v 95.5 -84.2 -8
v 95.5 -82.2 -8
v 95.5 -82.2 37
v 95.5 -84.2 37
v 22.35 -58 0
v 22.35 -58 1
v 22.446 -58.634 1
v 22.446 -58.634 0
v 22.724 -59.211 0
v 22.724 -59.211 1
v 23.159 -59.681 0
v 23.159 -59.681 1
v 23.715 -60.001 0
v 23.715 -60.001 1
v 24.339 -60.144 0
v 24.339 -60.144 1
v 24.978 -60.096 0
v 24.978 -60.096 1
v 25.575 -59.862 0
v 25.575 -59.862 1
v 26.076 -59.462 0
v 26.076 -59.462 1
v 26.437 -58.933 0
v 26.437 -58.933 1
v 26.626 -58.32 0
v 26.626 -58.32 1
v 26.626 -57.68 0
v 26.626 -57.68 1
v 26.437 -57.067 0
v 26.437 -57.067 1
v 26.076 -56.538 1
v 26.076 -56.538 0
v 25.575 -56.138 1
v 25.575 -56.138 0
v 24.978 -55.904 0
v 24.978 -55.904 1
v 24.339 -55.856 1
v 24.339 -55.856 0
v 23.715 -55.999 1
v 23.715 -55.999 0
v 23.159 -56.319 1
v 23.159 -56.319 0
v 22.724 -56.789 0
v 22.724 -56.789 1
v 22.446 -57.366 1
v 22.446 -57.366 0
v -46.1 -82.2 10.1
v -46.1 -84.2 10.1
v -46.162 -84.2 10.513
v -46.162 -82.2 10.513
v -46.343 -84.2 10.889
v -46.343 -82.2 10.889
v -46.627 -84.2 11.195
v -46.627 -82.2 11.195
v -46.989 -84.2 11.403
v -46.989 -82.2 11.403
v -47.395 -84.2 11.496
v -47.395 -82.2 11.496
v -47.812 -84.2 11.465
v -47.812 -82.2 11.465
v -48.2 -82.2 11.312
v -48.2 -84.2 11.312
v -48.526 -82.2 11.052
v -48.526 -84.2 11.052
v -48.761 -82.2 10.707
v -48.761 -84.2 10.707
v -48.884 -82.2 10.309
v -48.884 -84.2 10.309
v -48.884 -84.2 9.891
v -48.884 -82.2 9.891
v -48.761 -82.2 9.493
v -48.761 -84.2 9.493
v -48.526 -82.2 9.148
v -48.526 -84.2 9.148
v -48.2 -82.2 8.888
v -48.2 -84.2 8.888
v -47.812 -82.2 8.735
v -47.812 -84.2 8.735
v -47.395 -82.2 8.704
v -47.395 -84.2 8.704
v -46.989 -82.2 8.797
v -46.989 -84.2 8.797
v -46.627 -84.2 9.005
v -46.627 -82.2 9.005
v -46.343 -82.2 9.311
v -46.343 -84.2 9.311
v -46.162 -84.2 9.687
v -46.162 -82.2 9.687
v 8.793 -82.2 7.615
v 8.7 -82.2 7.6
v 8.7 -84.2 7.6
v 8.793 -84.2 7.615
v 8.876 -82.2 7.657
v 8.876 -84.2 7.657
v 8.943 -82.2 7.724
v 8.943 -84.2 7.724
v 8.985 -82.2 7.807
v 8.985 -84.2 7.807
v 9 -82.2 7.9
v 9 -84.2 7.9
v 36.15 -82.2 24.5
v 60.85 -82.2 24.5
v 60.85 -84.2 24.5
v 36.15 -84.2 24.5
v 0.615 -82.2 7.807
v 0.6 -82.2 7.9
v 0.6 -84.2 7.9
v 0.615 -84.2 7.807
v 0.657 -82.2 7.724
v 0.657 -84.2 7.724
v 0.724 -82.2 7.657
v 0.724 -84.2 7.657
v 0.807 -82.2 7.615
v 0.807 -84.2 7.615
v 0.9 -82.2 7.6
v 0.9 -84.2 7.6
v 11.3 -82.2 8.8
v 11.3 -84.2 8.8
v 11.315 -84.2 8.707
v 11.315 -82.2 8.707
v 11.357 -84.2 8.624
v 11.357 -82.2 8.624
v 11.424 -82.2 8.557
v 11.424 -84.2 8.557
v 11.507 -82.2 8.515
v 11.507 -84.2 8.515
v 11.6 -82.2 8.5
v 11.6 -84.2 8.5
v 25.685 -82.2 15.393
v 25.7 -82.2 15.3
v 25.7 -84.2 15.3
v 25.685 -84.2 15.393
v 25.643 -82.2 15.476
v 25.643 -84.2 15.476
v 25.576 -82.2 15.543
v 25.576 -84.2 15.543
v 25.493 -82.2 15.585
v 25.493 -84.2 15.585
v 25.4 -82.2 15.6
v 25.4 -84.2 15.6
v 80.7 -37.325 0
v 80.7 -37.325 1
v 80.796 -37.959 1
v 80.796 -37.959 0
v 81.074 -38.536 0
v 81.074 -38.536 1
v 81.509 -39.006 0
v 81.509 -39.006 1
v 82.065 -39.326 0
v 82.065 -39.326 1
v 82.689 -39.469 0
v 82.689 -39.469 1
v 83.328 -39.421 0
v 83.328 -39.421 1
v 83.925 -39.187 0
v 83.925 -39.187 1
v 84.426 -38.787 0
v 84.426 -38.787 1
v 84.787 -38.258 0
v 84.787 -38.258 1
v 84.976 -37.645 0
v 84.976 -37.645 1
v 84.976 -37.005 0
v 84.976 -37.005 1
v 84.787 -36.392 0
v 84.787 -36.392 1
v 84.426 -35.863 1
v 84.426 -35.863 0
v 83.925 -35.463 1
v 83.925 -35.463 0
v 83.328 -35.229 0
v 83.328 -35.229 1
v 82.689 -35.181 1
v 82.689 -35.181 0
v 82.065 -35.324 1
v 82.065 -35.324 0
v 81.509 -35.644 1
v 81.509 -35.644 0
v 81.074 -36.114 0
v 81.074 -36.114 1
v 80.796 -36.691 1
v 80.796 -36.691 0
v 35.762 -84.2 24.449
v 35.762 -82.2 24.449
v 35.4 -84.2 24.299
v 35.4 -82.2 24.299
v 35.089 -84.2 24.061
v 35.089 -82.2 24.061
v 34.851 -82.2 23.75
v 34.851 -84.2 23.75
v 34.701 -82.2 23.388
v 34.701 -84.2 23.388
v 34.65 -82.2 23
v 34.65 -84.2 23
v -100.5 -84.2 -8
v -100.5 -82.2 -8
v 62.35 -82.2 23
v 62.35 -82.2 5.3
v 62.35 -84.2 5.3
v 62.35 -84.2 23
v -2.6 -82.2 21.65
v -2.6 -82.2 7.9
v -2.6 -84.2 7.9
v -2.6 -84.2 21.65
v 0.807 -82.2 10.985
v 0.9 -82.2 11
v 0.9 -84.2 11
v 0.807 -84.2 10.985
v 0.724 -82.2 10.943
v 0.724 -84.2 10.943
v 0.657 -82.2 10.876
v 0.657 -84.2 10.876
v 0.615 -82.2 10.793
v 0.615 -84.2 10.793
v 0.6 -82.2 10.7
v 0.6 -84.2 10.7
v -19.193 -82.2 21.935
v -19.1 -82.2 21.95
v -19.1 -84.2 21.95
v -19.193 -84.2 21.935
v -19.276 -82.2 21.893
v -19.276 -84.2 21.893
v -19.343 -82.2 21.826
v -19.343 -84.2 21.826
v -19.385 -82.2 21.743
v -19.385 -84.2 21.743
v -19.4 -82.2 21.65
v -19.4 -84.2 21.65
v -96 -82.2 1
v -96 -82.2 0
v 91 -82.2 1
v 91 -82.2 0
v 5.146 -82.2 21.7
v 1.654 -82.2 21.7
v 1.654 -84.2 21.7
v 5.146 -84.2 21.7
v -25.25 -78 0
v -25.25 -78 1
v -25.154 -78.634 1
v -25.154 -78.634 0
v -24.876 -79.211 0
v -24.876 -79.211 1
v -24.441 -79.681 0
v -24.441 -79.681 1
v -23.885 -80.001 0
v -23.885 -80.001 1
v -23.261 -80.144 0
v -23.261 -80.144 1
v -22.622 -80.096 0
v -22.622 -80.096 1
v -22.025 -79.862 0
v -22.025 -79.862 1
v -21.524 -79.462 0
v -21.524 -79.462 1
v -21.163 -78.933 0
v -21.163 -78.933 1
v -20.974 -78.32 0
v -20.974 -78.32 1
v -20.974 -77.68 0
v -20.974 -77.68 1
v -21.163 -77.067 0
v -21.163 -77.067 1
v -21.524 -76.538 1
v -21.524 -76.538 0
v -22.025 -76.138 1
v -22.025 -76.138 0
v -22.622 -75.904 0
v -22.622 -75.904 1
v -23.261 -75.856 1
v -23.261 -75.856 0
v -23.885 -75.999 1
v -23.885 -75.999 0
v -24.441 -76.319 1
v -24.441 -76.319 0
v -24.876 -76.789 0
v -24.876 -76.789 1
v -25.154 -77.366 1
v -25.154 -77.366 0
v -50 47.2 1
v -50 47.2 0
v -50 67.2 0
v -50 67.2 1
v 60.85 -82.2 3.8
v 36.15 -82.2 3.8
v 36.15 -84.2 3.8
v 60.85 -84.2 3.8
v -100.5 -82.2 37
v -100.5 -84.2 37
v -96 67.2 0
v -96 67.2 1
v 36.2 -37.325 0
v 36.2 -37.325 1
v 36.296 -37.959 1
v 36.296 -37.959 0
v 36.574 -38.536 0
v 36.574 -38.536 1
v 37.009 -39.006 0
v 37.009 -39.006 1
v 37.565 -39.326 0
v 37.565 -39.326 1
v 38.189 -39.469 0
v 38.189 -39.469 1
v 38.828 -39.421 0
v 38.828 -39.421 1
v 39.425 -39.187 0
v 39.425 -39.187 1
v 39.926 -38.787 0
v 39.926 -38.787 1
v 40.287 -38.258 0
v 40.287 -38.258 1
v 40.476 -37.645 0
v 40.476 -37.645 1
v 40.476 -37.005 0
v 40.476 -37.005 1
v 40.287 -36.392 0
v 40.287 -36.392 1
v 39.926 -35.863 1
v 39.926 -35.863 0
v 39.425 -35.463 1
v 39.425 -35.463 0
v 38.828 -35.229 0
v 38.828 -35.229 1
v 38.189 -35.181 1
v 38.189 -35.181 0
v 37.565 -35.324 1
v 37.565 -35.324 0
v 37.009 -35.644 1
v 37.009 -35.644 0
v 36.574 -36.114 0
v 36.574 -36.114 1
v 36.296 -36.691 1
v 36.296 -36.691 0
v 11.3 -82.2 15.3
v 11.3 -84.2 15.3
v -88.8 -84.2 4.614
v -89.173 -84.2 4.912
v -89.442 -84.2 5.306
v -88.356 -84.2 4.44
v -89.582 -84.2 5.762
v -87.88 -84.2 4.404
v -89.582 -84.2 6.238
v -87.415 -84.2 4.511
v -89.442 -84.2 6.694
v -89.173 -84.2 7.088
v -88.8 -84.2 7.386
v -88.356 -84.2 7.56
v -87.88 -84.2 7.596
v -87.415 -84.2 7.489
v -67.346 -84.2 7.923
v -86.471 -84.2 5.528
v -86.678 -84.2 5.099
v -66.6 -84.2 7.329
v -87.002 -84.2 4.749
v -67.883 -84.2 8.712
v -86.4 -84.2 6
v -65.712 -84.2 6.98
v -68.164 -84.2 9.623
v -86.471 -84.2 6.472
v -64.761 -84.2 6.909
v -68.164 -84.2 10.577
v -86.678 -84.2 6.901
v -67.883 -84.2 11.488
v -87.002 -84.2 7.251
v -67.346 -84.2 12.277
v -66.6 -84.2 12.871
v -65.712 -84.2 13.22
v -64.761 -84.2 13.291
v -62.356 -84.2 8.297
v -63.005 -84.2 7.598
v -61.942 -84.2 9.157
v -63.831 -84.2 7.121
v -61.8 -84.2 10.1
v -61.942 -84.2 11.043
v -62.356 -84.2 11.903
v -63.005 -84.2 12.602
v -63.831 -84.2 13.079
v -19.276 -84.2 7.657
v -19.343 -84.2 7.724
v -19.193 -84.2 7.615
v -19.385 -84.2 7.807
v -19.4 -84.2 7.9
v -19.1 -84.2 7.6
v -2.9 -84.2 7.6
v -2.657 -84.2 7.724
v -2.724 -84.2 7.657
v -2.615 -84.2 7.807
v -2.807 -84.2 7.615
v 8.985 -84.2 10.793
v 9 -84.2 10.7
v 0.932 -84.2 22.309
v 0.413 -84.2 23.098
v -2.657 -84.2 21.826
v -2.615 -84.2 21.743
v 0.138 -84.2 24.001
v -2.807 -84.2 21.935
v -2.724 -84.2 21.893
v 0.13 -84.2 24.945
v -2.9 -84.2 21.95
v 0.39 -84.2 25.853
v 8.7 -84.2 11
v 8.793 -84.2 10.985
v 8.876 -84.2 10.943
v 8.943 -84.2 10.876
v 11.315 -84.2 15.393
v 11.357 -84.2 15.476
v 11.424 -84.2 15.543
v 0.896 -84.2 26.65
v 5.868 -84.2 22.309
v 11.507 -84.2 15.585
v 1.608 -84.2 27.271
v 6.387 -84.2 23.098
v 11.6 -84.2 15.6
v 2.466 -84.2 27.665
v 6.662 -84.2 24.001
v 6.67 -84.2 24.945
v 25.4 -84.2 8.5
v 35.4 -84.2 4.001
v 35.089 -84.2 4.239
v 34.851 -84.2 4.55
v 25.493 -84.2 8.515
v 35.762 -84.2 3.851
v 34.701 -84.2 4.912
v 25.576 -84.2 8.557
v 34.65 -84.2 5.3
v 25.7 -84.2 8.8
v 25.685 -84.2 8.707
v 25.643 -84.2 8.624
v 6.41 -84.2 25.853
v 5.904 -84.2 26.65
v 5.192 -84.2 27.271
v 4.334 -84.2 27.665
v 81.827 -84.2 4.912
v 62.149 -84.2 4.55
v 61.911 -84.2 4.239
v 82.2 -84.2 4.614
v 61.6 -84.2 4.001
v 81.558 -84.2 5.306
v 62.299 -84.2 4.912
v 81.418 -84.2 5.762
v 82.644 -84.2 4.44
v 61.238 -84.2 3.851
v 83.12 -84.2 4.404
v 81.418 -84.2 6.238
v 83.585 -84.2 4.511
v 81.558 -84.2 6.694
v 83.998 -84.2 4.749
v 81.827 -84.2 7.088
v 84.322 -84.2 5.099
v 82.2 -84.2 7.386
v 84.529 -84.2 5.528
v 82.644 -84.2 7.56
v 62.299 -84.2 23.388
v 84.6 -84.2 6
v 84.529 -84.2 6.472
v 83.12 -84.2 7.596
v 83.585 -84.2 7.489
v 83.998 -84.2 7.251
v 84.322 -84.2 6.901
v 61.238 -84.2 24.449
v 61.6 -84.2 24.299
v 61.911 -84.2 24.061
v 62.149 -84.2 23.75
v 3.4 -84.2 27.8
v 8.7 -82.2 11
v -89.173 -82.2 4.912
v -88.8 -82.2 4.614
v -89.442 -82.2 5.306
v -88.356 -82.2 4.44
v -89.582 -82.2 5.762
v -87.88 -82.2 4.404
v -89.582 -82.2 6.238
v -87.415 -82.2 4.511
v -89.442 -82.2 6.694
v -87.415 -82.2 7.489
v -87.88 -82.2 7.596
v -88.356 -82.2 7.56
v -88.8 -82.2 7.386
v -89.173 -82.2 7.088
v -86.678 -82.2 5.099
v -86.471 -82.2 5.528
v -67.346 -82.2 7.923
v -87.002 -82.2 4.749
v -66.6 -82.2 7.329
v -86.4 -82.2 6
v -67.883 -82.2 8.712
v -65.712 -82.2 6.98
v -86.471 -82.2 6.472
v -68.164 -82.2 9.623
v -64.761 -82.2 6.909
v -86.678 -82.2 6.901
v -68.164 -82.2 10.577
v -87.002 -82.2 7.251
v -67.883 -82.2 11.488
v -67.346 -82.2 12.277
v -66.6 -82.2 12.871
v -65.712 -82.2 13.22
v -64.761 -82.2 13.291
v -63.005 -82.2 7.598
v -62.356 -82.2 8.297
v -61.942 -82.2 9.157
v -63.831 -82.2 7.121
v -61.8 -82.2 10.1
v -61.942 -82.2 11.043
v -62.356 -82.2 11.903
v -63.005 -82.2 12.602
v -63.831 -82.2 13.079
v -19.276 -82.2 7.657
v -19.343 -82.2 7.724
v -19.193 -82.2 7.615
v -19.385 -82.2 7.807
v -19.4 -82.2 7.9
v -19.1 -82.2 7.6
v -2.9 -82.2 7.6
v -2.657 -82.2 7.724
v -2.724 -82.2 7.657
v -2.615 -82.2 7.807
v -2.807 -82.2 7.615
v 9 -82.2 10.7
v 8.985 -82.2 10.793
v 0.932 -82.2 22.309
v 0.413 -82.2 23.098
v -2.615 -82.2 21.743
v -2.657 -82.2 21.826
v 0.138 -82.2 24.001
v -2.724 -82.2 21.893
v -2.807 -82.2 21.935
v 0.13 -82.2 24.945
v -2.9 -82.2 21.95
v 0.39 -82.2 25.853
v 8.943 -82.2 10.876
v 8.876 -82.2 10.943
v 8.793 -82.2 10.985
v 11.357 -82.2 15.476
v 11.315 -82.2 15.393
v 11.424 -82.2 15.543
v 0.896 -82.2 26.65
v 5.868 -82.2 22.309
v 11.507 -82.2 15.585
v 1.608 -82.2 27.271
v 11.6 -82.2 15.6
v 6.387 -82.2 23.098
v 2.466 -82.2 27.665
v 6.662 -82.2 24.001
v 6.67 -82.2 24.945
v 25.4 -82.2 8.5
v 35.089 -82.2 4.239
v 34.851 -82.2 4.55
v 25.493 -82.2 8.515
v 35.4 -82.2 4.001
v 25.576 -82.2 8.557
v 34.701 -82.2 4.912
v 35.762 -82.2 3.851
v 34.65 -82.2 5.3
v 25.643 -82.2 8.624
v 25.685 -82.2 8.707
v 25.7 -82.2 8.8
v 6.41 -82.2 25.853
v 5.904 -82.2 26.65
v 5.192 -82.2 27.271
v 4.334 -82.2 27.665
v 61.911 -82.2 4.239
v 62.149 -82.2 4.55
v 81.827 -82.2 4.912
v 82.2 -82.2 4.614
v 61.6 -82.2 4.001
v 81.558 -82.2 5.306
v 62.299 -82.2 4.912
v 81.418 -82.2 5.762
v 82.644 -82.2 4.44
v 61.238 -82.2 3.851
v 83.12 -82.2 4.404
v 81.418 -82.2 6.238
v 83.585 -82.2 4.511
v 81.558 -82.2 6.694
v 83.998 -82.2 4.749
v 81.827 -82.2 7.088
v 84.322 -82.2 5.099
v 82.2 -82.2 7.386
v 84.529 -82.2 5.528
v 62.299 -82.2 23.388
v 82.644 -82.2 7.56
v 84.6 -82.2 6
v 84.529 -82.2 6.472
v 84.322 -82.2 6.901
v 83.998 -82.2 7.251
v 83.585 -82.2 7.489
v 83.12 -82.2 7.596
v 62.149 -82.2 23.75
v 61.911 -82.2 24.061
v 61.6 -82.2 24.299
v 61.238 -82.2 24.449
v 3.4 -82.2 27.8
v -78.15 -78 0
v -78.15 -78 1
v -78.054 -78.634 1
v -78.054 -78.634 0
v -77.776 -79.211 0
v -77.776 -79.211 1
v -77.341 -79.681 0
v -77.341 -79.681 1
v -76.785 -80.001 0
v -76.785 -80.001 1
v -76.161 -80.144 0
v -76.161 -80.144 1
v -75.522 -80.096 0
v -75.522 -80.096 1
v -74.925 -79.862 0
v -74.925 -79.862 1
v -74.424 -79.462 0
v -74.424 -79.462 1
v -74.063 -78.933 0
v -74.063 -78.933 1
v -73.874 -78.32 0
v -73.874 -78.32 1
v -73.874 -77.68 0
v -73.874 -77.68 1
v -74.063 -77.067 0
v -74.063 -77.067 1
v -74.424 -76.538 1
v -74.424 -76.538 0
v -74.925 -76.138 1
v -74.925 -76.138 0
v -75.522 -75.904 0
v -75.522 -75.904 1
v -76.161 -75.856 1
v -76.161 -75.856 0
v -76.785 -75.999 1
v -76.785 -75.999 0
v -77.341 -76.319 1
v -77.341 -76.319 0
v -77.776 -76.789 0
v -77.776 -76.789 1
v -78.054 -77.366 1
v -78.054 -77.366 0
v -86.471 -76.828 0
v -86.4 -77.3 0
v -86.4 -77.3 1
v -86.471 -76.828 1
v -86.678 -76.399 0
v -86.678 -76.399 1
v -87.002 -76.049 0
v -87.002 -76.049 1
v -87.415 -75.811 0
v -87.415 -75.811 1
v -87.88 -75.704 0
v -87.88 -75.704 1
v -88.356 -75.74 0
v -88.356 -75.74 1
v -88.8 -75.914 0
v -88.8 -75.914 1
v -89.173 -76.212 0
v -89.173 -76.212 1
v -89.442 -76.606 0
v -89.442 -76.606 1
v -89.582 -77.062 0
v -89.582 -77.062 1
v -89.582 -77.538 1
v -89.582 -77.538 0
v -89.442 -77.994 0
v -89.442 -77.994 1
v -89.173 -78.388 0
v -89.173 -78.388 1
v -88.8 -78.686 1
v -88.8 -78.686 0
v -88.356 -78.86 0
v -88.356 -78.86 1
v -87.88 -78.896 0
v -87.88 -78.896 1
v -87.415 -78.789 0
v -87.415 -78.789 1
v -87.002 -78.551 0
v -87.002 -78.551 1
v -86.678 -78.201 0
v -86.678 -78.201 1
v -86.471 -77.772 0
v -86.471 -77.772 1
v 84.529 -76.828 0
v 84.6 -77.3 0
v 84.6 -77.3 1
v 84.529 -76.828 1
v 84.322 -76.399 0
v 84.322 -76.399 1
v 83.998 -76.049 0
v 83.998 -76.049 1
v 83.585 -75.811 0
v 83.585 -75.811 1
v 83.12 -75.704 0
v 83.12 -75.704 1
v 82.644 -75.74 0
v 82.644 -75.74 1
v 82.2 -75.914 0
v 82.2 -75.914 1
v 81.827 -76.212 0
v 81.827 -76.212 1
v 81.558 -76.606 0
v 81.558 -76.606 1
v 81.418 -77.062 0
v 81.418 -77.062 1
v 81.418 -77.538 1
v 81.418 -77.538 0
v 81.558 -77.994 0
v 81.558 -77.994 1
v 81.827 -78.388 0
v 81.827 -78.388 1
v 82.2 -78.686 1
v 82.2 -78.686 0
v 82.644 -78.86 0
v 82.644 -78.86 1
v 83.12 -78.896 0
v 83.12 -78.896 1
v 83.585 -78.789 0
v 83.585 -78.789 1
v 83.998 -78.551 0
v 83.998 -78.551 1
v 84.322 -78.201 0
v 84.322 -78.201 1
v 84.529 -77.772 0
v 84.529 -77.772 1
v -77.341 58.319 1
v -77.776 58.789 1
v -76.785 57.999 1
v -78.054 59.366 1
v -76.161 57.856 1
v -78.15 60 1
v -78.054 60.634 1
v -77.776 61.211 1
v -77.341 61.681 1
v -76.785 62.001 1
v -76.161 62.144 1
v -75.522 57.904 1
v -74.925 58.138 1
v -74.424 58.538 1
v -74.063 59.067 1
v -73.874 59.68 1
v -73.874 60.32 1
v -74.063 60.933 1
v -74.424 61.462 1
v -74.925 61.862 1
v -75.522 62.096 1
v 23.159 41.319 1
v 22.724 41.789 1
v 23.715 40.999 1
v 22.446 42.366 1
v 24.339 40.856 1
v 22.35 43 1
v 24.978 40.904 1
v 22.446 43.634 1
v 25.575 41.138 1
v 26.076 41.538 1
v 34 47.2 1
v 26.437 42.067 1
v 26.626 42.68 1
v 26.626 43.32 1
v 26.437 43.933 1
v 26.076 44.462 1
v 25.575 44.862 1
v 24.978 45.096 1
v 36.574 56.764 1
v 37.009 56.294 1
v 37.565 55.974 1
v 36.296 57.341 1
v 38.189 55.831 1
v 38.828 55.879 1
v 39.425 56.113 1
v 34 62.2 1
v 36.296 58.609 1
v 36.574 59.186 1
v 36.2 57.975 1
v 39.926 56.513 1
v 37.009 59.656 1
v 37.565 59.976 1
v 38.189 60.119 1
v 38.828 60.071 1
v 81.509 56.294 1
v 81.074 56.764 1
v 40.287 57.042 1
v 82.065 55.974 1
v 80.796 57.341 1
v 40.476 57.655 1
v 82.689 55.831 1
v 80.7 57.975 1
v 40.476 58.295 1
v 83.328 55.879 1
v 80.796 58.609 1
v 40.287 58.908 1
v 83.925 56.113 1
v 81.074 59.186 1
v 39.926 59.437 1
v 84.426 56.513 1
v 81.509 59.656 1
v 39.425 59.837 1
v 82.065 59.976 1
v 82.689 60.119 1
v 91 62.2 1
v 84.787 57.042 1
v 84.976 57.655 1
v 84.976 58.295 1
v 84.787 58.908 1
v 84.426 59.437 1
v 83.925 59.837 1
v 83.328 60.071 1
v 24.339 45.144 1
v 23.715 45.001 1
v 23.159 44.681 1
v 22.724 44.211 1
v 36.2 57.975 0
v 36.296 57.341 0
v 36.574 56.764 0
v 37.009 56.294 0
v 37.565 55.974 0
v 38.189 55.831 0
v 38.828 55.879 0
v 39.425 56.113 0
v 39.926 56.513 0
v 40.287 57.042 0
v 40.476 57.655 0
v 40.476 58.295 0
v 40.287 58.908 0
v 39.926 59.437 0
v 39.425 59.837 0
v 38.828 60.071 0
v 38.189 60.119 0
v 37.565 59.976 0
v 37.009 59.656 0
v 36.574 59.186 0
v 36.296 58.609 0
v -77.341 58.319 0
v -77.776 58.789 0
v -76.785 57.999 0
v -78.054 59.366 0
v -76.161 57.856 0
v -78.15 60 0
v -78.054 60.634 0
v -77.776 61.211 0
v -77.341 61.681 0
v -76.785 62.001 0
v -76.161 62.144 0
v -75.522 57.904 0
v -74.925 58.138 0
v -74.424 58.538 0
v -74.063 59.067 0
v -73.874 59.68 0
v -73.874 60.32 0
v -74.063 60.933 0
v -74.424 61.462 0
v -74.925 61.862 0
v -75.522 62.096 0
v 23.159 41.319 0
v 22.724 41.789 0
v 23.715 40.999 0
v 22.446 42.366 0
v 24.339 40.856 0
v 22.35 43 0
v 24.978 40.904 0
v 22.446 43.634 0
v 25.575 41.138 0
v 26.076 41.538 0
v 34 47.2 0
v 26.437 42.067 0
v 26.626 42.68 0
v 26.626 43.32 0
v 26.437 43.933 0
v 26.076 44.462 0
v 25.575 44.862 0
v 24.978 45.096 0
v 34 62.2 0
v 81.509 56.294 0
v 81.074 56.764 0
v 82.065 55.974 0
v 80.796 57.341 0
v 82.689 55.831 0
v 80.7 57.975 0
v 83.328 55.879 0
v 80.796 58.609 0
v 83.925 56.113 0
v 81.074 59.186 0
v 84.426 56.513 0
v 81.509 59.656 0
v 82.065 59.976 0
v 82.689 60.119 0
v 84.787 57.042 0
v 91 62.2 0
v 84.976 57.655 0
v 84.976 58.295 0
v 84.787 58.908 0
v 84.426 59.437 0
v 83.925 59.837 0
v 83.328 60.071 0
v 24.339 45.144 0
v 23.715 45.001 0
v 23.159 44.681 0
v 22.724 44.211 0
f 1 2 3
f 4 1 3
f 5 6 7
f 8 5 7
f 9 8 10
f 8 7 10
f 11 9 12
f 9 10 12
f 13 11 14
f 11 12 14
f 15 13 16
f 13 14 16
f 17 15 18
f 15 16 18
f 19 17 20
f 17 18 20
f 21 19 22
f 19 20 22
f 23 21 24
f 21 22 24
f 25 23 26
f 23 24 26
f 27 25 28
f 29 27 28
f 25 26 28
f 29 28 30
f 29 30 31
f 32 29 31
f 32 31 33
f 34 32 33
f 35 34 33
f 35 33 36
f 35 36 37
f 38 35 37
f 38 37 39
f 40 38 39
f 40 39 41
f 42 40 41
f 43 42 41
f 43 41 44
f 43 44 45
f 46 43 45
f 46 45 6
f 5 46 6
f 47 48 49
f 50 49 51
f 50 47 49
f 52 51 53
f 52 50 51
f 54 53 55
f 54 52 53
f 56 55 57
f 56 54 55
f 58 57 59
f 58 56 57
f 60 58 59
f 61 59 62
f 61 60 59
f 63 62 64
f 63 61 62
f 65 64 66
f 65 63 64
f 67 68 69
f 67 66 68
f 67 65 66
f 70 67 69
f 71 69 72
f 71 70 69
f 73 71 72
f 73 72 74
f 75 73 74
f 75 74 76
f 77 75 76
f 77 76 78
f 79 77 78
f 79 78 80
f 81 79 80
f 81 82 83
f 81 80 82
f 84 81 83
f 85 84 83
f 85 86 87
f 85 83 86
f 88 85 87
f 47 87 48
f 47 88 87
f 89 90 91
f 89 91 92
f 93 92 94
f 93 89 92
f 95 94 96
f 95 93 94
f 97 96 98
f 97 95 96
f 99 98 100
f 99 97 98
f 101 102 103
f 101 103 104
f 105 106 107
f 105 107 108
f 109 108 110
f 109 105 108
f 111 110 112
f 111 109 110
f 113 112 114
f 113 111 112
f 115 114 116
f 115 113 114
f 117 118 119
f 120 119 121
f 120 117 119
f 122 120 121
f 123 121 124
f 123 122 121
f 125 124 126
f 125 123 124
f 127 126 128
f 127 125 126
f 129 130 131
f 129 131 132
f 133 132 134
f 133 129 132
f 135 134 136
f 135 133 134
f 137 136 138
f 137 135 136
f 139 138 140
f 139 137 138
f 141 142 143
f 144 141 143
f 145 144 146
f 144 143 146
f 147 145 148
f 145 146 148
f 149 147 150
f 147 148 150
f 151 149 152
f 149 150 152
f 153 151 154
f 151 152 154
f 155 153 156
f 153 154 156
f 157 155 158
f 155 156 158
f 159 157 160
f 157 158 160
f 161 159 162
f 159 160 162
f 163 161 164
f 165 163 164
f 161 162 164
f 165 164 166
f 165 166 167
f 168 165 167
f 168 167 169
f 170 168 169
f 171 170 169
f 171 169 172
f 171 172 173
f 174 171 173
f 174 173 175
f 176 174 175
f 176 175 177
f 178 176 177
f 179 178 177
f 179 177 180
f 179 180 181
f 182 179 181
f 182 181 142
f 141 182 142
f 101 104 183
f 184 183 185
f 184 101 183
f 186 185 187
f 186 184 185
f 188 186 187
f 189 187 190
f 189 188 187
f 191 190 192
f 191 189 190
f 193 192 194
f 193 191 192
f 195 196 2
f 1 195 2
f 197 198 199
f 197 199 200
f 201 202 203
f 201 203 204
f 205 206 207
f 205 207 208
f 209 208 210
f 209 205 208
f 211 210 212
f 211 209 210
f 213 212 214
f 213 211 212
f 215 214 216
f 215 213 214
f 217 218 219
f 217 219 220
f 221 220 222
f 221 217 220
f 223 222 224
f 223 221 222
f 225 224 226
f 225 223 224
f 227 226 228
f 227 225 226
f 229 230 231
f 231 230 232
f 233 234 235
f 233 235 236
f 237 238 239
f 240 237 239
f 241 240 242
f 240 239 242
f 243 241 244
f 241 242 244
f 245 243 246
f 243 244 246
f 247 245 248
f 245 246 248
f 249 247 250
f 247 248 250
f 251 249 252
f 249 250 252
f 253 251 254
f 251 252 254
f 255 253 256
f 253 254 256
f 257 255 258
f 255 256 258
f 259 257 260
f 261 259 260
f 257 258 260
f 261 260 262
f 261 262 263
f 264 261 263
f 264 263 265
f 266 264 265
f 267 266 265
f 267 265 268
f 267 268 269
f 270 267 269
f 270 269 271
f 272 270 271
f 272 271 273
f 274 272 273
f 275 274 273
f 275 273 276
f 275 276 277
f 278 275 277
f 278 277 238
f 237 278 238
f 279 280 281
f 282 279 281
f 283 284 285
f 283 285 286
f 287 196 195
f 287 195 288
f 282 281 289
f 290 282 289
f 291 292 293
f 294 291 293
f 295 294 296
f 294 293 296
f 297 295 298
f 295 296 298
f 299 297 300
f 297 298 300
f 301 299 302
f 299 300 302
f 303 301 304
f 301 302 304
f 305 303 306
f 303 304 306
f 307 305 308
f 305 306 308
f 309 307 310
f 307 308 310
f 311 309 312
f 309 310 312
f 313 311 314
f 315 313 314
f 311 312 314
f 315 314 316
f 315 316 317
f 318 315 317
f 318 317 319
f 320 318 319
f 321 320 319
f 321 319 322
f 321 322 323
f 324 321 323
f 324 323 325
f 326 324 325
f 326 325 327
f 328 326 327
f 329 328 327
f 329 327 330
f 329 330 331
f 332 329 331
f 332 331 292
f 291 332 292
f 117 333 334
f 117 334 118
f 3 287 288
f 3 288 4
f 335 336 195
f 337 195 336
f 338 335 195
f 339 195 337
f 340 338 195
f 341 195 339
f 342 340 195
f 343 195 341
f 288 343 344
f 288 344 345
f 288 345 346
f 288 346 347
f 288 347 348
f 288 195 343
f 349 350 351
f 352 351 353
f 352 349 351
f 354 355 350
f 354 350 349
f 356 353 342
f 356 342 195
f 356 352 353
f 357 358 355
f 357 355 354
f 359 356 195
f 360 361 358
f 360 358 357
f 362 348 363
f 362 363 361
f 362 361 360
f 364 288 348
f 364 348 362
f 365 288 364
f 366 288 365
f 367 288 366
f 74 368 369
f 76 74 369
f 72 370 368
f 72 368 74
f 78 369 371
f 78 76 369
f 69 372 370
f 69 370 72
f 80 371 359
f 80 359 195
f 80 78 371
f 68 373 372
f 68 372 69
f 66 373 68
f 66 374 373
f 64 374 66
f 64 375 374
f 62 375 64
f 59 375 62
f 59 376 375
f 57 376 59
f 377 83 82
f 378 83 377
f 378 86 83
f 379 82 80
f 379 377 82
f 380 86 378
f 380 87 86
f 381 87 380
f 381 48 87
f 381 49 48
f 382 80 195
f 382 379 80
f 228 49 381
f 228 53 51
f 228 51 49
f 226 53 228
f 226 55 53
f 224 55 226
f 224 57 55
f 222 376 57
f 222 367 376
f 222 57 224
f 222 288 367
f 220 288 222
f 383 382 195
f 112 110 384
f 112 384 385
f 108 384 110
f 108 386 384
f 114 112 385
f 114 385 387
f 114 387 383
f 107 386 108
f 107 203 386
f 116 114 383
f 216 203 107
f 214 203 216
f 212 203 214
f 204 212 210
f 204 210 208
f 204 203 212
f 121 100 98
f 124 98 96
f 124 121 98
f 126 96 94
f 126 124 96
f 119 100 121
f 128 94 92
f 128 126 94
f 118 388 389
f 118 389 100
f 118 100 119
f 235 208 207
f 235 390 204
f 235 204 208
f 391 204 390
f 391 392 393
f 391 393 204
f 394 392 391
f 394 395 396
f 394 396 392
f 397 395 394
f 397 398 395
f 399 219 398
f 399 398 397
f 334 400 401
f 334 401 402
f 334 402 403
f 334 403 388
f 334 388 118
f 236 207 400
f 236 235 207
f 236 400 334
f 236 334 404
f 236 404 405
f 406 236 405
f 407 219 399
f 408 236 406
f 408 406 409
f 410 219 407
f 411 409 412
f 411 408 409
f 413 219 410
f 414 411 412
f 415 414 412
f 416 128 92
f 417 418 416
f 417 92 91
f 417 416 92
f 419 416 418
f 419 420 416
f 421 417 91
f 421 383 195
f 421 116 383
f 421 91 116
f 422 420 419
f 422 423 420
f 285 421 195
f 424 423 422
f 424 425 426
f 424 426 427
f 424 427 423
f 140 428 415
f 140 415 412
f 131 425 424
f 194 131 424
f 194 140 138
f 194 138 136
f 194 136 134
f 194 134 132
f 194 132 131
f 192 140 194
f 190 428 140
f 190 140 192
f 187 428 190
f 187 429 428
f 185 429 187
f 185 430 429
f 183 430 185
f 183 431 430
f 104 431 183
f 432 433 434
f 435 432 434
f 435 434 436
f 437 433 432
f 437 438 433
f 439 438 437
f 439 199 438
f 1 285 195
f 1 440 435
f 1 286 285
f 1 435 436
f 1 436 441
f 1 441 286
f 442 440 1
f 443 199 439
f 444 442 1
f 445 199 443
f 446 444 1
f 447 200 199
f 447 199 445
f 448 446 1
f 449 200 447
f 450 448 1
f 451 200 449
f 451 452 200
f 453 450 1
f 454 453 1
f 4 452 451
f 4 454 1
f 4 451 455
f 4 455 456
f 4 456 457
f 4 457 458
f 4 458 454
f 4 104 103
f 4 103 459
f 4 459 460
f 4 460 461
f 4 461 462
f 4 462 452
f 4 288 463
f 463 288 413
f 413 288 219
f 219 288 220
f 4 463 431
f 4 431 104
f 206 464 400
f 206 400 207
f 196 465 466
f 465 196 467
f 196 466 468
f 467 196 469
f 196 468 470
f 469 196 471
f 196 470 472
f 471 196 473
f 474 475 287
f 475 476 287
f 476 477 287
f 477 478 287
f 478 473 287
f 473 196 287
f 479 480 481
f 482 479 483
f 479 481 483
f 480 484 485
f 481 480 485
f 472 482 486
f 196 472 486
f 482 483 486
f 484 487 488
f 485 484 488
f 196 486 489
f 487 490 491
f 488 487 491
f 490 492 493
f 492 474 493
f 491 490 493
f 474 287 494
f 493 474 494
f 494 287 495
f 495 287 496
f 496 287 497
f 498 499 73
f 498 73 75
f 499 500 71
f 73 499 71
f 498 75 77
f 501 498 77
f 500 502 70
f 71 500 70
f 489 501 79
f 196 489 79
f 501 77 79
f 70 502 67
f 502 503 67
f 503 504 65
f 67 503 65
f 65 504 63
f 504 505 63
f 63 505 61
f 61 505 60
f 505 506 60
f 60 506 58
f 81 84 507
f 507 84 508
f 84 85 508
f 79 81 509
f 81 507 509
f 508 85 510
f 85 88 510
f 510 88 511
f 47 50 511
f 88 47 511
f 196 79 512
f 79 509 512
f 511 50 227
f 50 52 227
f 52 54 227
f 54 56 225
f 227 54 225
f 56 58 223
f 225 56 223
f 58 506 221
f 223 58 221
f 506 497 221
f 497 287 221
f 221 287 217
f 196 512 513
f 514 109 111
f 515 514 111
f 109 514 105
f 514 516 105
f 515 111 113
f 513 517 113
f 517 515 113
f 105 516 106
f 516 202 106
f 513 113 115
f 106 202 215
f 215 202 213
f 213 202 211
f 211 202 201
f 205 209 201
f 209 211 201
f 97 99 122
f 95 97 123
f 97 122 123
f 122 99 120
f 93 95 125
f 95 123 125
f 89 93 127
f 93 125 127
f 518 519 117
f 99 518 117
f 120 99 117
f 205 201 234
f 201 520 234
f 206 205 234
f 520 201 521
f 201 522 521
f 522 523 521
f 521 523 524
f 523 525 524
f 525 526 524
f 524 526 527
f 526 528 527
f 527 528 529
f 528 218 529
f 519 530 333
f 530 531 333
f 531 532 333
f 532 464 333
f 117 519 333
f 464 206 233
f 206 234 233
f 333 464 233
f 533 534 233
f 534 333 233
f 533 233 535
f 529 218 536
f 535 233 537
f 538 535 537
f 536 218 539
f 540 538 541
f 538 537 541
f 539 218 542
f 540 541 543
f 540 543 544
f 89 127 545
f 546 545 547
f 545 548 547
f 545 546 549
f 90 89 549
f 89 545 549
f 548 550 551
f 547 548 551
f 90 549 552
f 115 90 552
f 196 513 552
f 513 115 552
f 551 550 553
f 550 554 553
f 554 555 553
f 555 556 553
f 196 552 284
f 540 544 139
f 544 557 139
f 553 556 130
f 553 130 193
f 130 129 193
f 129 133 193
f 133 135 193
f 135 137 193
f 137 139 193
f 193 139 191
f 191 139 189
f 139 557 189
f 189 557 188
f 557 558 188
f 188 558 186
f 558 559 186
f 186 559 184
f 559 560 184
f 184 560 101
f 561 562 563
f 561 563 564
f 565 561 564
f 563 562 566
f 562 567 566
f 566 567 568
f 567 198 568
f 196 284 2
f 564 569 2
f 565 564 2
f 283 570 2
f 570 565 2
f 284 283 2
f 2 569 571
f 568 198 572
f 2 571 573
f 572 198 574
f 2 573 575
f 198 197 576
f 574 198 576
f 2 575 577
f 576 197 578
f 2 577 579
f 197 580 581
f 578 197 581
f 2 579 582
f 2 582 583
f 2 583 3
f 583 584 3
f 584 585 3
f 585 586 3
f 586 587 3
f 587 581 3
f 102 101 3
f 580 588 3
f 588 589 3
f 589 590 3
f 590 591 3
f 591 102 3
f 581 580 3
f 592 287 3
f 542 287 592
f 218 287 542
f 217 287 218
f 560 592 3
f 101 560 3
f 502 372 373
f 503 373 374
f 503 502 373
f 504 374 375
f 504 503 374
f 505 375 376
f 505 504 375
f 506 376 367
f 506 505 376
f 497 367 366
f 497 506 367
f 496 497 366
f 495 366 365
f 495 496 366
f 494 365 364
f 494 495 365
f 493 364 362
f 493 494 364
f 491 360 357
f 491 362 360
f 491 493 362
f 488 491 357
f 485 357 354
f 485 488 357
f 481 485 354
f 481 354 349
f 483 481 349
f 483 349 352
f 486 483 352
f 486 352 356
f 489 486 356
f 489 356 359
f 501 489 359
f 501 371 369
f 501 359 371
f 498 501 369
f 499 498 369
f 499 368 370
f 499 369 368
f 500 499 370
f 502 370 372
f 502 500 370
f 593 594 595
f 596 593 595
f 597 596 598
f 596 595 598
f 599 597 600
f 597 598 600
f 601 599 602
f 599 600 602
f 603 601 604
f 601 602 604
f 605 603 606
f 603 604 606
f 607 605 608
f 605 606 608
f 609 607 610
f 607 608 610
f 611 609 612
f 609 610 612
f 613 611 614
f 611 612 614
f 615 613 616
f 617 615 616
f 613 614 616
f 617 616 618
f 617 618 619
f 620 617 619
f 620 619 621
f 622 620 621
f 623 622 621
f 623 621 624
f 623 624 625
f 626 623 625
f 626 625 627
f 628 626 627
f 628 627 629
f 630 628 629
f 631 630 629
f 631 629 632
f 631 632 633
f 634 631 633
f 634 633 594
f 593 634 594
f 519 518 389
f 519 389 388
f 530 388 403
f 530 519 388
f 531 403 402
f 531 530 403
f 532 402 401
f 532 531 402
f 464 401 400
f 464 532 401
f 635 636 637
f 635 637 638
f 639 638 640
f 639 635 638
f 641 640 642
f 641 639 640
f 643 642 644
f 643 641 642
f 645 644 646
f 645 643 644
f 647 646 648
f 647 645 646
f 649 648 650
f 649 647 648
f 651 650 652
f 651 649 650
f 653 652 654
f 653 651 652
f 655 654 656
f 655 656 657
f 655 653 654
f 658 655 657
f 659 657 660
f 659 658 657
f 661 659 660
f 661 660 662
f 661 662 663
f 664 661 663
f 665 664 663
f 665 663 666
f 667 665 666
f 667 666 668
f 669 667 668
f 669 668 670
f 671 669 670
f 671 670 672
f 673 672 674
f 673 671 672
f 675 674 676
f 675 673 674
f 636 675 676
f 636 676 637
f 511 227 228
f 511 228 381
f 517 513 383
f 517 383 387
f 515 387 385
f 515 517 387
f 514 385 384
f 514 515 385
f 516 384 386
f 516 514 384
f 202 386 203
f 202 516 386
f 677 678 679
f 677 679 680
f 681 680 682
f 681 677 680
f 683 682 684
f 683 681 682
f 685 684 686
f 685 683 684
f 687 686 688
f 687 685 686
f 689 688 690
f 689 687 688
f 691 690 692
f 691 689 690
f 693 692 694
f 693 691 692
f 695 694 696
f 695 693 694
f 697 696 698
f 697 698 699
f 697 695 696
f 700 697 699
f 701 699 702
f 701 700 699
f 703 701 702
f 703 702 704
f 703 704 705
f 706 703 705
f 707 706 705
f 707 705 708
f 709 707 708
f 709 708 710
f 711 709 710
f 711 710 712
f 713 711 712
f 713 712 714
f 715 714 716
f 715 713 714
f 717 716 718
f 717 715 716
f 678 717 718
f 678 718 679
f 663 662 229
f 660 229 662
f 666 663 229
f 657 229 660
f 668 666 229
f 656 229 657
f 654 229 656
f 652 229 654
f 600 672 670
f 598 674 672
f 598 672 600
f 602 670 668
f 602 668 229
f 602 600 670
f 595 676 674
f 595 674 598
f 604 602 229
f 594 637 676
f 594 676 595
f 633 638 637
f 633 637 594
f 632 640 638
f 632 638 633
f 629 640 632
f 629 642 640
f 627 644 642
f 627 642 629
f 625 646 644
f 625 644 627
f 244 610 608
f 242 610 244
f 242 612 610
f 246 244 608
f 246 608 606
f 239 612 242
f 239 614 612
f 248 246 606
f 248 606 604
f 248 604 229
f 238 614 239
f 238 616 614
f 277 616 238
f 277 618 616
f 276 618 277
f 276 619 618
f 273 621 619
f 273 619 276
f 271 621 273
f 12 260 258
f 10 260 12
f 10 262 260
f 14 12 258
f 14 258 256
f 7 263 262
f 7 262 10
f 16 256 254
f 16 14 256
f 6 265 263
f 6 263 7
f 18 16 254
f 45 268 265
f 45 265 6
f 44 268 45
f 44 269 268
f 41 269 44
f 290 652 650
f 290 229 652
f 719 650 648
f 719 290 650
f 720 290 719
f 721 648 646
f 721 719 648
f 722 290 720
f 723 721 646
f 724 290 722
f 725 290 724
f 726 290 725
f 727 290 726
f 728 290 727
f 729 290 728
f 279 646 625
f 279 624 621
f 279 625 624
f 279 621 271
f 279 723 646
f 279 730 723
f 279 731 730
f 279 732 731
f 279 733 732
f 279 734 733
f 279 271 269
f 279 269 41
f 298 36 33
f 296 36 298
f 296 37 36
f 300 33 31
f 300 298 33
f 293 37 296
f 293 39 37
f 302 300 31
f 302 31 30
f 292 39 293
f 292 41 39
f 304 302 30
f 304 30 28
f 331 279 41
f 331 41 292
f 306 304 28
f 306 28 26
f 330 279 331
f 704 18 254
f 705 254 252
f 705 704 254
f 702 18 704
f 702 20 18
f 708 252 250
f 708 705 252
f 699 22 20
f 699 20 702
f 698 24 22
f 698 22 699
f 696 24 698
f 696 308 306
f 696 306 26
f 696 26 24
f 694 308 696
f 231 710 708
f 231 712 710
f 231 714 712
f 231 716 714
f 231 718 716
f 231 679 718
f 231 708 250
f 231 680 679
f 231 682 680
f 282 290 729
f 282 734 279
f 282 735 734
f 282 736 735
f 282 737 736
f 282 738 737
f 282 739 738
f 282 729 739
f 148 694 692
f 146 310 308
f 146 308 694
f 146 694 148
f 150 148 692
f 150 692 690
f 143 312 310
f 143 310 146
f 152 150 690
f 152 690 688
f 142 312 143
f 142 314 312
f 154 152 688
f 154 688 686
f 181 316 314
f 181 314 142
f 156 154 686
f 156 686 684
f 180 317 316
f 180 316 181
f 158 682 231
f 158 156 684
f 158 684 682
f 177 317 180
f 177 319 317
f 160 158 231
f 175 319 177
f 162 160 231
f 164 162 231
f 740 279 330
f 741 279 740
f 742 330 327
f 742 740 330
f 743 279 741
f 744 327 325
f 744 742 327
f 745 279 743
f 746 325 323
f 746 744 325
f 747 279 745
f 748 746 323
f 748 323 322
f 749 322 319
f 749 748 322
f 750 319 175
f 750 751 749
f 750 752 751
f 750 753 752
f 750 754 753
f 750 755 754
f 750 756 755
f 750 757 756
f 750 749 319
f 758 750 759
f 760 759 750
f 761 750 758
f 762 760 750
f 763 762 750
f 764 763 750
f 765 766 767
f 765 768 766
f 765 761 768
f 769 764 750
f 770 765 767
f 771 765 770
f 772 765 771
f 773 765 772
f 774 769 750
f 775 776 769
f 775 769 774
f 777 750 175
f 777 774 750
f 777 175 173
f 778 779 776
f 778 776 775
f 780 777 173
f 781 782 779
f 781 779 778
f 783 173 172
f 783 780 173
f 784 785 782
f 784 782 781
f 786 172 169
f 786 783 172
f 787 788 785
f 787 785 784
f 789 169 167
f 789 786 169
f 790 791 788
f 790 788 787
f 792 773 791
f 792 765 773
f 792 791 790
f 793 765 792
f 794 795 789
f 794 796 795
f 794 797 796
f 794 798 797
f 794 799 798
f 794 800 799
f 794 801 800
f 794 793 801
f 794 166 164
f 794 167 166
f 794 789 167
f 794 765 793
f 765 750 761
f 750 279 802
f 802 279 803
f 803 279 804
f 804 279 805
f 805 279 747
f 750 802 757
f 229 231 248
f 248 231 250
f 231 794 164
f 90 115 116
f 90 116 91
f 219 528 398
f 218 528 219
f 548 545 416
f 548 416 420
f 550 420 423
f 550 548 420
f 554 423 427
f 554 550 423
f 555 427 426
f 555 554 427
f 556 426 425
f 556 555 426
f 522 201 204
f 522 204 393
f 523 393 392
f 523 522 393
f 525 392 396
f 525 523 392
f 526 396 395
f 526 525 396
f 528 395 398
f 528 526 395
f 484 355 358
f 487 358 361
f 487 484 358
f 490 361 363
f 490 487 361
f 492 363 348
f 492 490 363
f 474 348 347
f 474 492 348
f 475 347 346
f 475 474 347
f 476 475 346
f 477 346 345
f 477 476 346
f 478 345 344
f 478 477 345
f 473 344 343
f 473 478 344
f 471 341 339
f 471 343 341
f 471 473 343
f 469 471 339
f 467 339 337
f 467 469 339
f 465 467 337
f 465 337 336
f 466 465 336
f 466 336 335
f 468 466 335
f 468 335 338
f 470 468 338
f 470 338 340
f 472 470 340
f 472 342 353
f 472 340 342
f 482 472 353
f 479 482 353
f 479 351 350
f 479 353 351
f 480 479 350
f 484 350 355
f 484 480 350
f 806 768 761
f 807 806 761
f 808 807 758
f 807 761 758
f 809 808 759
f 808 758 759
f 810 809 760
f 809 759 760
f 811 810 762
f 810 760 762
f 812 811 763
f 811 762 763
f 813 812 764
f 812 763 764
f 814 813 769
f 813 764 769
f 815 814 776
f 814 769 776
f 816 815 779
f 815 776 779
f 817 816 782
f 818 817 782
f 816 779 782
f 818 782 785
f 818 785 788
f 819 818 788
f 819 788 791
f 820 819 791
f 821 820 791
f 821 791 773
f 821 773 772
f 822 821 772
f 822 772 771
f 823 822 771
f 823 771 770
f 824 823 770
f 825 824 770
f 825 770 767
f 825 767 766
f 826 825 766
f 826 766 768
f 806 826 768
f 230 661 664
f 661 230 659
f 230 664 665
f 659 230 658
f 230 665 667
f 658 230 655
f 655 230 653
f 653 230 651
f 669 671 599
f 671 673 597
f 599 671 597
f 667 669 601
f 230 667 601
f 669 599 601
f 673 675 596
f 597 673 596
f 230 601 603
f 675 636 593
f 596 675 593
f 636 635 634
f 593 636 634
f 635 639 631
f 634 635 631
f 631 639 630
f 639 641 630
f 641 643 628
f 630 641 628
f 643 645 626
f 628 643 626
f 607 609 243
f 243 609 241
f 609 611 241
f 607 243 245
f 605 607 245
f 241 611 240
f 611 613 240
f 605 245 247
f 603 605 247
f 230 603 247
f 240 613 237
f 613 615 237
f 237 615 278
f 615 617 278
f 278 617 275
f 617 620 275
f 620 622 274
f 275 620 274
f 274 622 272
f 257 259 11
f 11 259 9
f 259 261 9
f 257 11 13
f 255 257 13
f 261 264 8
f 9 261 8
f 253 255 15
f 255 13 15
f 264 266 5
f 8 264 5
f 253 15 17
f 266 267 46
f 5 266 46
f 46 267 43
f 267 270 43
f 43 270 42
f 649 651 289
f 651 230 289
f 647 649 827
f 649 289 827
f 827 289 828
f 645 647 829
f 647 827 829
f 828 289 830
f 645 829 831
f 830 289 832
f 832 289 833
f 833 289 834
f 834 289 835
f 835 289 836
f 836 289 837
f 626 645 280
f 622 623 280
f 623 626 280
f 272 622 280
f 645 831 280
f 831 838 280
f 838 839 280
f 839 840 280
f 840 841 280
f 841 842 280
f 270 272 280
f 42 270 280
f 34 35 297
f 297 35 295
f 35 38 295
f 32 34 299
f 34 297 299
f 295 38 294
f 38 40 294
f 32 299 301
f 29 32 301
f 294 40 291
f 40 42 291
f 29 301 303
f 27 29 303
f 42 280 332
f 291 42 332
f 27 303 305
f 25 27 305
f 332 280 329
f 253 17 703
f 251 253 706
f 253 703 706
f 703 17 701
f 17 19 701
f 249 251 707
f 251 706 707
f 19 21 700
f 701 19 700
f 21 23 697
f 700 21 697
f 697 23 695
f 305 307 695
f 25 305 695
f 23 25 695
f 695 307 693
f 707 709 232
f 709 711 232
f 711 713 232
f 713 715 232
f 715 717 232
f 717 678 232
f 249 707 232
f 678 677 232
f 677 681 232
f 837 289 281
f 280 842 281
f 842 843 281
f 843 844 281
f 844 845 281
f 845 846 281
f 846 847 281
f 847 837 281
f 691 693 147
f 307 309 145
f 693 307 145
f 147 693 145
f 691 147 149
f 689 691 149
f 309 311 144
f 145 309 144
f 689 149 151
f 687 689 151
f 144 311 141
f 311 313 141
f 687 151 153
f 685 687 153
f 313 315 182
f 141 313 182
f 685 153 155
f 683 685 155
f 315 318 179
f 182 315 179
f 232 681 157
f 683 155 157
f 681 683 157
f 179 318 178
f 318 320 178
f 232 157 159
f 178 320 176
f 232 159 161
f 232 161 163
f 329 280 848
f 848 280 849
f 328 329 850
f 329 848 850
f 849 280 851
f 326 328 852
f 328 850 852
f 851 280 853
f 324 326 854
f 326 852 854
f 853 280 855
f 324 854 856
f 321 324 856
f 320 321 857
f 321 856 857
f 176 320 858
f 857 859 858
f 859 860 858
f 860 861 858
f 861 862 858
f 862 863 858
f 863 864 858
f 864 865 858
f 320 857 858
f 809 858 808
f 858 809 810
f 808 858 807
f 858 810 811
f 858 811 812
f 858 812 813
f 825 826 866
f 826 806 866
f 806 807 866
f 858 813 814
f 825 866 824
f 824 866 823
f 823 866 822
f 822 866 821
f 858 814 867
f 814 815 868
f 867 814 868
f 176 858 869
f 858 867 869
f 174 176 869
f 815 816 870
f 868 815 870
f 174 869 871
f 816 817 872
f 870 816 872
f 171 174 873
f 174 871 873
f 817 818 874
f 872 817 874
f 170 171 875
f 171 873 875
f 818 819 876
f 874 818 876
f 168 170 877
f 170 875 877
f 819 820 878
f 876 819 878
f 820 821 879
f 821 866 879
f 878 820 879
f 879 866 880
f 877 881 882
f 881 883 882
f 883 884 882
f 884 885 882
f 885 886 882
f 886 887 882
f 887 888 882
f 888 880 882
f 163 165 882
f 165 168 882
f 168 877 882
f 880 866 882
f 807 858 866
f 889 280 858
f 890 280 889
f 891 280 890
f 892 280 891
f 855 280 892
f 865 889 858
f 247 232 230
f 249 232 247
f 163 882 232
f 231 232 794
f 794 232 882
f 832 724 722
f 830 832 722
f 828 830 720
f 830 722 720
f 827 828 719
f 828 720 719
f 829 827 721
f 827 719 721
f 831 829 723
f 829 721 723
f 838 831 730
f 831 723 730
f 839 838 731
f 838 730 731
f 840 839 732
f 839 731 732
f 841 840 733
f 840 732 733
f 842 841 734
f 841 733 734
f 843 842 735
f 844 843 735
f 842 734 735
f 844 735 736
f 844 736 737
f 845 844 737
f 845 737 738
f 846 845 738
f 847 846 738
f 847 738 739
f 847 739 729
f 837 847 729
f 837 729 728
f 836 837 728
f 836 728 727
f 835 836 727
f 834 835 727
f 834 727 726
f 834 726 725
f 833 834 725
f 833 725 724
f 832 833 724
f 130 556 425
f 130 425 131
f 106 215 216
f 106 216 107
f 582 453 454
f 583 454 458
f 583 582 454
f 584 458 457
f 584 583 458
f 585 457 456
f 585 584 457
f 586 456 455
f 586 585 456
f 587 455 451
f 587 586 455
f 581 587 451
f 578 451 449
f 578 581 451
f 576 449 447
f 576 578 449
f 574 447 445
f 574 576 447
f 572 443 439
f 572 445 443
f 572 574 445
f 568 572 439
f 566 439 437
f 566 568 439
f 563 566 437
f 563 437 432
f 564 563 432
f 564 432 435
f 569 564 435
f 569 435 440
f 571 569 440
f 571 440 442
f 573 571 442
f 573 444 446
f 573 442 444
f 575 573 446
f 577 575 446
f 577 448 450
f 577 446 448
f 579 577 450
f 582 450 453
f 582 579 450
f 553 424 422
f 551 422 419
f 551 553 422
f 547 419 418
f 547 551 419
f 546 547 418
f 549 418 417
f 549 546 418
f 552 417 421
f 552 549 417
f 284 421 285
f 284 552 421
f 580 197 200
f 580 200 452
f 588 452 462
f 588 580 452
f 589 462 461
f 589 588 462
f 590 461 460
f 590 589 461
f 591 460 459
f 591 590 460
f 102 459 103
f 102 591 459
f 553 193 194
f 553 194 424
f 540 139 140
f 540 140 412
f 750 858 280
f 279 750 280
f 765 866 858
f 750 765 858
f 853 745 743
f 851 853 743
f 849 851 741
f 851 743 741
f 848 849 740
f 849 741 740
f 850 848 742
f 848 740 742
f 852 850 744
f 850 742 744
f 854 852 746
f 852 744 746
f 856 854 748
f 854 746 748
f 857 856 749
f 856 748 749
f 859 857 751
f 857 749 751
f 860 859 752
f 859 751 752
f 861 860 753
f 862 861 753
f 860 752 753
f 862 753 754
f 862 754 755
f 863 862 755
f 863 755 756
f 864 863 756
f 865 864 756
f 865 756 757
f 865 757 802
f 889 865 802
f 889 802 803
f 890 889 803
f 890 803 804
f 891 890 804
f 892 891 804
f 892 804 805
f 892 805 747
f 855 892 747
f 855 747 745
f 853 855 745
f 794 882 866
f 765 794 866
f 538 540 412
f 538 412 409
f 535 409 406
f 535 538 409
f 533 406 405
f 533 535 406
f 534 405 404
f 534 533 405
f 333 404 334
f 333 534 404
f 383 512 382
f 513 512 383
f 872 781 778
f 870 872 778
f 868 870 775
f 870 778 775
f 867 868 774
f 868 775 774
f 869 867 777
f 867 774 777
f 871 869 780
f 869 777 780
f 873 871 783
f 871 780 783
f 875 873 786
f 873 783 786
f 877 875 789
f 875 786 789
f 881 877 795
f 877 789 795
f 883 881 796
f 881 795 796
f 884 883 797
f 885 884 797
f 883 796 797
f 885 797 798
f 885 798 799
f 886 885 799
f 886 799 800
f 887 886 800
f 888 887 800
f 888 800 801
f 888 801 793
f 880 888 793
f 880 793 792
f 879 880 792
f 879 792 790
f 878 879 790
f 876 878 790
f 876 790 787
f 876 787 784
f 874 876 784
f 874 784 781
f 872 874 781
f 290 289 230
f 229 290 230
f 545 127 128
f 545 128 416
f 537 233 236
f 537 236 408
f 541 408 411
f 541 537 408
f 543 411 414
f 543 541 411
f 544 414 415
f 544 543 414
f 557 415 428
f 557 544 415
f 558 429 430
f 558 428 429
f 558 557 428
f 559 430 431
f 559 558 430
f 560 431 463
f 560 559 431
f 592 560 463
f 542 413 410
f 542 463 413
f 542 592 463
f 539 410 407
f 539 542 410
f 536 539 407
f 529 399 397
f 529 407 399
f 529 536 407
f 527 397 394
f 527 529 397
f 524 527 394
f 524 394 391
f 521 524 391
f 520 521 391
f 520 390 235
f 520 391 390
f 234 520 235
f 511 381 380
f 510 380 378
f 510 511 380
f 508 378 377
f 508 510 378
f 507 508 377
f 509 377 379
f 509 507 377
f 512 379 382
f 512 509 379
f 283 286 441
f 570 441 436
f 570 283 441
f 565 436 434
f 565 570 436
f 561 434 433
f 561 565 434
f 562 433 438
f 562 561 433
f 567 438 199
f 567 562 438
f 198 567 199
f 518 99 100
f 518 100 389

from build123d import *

# Parameters (mm, degrees)
F0_R       = 1.6
F3_DEPTH   = 1
F4_D       = 4.3
F4_ON_F2_D = 4.3
F6_W       = 196
F6_H       = 45
F8_DEPTH   = 2
F7_R       = 3.2
F7_R_2     = 1.4
F7_R_3     = 1.6
F9_DEPTH   = 2.001


with BuildPart() as f3:
    # F0 (on Top) → F3 (new body)
    with BuildSketch(Plane.XY):
        Polygon((34, 62.2000009459), (34, 47.2000009459), (-50, 47.2000009459), (-50, 67.2000009459), (-96, 67.2000009459), (-96, -82.1999990541), (91, -82.1999990541), (91, 62.2000009459), align=None)
        with Locations((-88, -77.2999990541)):
            Circle(F0_R, mode=Mode.SUBTRACT)
        with Locations((83, -77.2999990541)):
            Circle(F0_R, mode=Mode.SUBTRACT)
    extrude(amount=F3_DEPTH)

    # F4 (through all)
    with Locations(Plane(origin=(0, 0, 0), x_dir=(1, 0, 0), z_dir=(0, 0, -1))):
        with Locations((-76, -60), (-76, 78), (-23.1, 78), (24.5, 58), (24.5, -43)):
            Hole(F4_D / 2)

    # F4 on F2 (through all)
    with Locations(Plane(origin=(0, 0, 0), x_dir=(1, 0, 0), z_dir=(0, 0, -1))):
        with Locations((38.35, -57.9750009459), (82.85, -57.9750009459), (82.85, 37.3249990541), (38.35, 37.3249990541)):
            Hole(F4_ON_F2_D / 2)


with BuildPart() as f8:
    # F6 (on offset) → F8 (new body)
    with BuildSketch(Plane.XZ.offset(82.2)):
        with Locations((-2.5, 14.5)):
            Rectangle(F6_W, F6_H)
    extrude(amount=F8_DEPTH)

    # F7 (on offset) → F9 (cut, through all)
    with BuildSketch(Plane.XZ.offset(82.2)):
        with BuildLine():
            ThreePointArc((34.65, 5.3), (35.0893398282, 4.2393398282), (36.15, 3.8))
            Line((36.15, 3.8), (60.85, 3.8))
            ThreePointArc((60.85, 3.8), (61.9106601718, 4.2393398282), (62.35, 5.3))
            Line((62.35, 5.3), (62.35, 23))
            ThreePointArc((62.35, 23), (61.9106601718, 24.0606601718), (60.85, 24.5))
            Line((60.85, 24.5), (36.15, 24.5))
            ThreePointArc((36.15, 24.5), (35.0893398282, 24.0606601718), (34.65, 23))
            Line((34.65, 23), (34.65, 5.3))
        make_face()
        with Locations((-65, 10.1)):
            Circle(F7_R)
        with BuildLine():
            ThreePointArc((-19.4, 7.9), (-19.3121320344, 7.6878679656), (-19.1, 7.6))
            Line((-19.1, 7.6), (-2.9, 7.6))
            ThreePointArc((-2.9, 7.6), (-2.6878679656, 7.6878679656), (-2.6, 7.9))
            Line((-2.6, 7.9), (-2.6, 21.65))
            ThreePointArc((-2.6, 21.65), (-2.6878679656, 21.8621320344), (-2.9, 21.95))
            Line((-2.9, 21.95), (-19.1, 21.95))
            ThreePointArc((-19.1, 21.95), (-19.3121320344, 21.8621320344), (-19.4, 21.65))
            Line((-19.4, 21.65), (-19.4, 7.9))
        make_face()
        with BuildLine():
            ThreePointArc((0.6, 7.9), (0.6878679656, 7.6878679656), (0.9, 7.6))
            Line((0.9, 7.6), (8.7, 7.6))
            ThreePointArc((8.7, 7.6), (8.9121320344, 7.6878679656), (9, 7.9))
            Line((9, 7.9), (9, 10.7))
            ThreePointArc((9, 10.7), (8.9121320344, 10.9121320344), (8.7, 11))
            Line((8.7, 11), (0.9, 11))
            ThreePointArc((0.9, 11), (0.6878679656, 10.9121320344), (0.6, 10.7))
            Line((0.6, 10.7), (0.6, 7.9))
        make_face()
        with BuildLine():
            ThreePointArc((11.3, 8.8), (11.3878679656, 8.5878679656), (11.6, 8.5))
            Line((11.6, 8.5), (25.4, 8.5))
            ThreePointArc((25.4, 8.5), (25.6121320344, 8.5878679656), (25.7, 8.8))
            Line((25.7, 8.8), (25.7, 15.3))
            ThreePointArc((25.7, 15.3), (25.6121320344, 15.5121320344), (25.4, 15.6))
            Line((25.4, 15.6), (11.6, 15.6))
            ThreePointArc((11.6, 15.6), (11.3878679656, 15.5121320344), (11.3, 15.3))
            Line((11.3, 15.3), (11.3, 8.8))
        make_face()
        with Locations((-47.5, 10.1)):
            Circle(F7_R_2)
        with BuildLine():
            Line((1.6535750803, 21.7), (5.1464249197, 21.7))
            ThreePointArc((5.1464249197, 21.7), (3.4, 27.8), (1.6535750803, 21.7))
        make_face()
        with Locations((-88, 6)):
            Circle(F7_R_3)
        with Locations((83, 6)):
            Circle(F7_R_3)
    extrude(amount=F9_DEPTH, mode=Mode.SUBTRACT)


solid = Compound([f3.part, f8.part])
